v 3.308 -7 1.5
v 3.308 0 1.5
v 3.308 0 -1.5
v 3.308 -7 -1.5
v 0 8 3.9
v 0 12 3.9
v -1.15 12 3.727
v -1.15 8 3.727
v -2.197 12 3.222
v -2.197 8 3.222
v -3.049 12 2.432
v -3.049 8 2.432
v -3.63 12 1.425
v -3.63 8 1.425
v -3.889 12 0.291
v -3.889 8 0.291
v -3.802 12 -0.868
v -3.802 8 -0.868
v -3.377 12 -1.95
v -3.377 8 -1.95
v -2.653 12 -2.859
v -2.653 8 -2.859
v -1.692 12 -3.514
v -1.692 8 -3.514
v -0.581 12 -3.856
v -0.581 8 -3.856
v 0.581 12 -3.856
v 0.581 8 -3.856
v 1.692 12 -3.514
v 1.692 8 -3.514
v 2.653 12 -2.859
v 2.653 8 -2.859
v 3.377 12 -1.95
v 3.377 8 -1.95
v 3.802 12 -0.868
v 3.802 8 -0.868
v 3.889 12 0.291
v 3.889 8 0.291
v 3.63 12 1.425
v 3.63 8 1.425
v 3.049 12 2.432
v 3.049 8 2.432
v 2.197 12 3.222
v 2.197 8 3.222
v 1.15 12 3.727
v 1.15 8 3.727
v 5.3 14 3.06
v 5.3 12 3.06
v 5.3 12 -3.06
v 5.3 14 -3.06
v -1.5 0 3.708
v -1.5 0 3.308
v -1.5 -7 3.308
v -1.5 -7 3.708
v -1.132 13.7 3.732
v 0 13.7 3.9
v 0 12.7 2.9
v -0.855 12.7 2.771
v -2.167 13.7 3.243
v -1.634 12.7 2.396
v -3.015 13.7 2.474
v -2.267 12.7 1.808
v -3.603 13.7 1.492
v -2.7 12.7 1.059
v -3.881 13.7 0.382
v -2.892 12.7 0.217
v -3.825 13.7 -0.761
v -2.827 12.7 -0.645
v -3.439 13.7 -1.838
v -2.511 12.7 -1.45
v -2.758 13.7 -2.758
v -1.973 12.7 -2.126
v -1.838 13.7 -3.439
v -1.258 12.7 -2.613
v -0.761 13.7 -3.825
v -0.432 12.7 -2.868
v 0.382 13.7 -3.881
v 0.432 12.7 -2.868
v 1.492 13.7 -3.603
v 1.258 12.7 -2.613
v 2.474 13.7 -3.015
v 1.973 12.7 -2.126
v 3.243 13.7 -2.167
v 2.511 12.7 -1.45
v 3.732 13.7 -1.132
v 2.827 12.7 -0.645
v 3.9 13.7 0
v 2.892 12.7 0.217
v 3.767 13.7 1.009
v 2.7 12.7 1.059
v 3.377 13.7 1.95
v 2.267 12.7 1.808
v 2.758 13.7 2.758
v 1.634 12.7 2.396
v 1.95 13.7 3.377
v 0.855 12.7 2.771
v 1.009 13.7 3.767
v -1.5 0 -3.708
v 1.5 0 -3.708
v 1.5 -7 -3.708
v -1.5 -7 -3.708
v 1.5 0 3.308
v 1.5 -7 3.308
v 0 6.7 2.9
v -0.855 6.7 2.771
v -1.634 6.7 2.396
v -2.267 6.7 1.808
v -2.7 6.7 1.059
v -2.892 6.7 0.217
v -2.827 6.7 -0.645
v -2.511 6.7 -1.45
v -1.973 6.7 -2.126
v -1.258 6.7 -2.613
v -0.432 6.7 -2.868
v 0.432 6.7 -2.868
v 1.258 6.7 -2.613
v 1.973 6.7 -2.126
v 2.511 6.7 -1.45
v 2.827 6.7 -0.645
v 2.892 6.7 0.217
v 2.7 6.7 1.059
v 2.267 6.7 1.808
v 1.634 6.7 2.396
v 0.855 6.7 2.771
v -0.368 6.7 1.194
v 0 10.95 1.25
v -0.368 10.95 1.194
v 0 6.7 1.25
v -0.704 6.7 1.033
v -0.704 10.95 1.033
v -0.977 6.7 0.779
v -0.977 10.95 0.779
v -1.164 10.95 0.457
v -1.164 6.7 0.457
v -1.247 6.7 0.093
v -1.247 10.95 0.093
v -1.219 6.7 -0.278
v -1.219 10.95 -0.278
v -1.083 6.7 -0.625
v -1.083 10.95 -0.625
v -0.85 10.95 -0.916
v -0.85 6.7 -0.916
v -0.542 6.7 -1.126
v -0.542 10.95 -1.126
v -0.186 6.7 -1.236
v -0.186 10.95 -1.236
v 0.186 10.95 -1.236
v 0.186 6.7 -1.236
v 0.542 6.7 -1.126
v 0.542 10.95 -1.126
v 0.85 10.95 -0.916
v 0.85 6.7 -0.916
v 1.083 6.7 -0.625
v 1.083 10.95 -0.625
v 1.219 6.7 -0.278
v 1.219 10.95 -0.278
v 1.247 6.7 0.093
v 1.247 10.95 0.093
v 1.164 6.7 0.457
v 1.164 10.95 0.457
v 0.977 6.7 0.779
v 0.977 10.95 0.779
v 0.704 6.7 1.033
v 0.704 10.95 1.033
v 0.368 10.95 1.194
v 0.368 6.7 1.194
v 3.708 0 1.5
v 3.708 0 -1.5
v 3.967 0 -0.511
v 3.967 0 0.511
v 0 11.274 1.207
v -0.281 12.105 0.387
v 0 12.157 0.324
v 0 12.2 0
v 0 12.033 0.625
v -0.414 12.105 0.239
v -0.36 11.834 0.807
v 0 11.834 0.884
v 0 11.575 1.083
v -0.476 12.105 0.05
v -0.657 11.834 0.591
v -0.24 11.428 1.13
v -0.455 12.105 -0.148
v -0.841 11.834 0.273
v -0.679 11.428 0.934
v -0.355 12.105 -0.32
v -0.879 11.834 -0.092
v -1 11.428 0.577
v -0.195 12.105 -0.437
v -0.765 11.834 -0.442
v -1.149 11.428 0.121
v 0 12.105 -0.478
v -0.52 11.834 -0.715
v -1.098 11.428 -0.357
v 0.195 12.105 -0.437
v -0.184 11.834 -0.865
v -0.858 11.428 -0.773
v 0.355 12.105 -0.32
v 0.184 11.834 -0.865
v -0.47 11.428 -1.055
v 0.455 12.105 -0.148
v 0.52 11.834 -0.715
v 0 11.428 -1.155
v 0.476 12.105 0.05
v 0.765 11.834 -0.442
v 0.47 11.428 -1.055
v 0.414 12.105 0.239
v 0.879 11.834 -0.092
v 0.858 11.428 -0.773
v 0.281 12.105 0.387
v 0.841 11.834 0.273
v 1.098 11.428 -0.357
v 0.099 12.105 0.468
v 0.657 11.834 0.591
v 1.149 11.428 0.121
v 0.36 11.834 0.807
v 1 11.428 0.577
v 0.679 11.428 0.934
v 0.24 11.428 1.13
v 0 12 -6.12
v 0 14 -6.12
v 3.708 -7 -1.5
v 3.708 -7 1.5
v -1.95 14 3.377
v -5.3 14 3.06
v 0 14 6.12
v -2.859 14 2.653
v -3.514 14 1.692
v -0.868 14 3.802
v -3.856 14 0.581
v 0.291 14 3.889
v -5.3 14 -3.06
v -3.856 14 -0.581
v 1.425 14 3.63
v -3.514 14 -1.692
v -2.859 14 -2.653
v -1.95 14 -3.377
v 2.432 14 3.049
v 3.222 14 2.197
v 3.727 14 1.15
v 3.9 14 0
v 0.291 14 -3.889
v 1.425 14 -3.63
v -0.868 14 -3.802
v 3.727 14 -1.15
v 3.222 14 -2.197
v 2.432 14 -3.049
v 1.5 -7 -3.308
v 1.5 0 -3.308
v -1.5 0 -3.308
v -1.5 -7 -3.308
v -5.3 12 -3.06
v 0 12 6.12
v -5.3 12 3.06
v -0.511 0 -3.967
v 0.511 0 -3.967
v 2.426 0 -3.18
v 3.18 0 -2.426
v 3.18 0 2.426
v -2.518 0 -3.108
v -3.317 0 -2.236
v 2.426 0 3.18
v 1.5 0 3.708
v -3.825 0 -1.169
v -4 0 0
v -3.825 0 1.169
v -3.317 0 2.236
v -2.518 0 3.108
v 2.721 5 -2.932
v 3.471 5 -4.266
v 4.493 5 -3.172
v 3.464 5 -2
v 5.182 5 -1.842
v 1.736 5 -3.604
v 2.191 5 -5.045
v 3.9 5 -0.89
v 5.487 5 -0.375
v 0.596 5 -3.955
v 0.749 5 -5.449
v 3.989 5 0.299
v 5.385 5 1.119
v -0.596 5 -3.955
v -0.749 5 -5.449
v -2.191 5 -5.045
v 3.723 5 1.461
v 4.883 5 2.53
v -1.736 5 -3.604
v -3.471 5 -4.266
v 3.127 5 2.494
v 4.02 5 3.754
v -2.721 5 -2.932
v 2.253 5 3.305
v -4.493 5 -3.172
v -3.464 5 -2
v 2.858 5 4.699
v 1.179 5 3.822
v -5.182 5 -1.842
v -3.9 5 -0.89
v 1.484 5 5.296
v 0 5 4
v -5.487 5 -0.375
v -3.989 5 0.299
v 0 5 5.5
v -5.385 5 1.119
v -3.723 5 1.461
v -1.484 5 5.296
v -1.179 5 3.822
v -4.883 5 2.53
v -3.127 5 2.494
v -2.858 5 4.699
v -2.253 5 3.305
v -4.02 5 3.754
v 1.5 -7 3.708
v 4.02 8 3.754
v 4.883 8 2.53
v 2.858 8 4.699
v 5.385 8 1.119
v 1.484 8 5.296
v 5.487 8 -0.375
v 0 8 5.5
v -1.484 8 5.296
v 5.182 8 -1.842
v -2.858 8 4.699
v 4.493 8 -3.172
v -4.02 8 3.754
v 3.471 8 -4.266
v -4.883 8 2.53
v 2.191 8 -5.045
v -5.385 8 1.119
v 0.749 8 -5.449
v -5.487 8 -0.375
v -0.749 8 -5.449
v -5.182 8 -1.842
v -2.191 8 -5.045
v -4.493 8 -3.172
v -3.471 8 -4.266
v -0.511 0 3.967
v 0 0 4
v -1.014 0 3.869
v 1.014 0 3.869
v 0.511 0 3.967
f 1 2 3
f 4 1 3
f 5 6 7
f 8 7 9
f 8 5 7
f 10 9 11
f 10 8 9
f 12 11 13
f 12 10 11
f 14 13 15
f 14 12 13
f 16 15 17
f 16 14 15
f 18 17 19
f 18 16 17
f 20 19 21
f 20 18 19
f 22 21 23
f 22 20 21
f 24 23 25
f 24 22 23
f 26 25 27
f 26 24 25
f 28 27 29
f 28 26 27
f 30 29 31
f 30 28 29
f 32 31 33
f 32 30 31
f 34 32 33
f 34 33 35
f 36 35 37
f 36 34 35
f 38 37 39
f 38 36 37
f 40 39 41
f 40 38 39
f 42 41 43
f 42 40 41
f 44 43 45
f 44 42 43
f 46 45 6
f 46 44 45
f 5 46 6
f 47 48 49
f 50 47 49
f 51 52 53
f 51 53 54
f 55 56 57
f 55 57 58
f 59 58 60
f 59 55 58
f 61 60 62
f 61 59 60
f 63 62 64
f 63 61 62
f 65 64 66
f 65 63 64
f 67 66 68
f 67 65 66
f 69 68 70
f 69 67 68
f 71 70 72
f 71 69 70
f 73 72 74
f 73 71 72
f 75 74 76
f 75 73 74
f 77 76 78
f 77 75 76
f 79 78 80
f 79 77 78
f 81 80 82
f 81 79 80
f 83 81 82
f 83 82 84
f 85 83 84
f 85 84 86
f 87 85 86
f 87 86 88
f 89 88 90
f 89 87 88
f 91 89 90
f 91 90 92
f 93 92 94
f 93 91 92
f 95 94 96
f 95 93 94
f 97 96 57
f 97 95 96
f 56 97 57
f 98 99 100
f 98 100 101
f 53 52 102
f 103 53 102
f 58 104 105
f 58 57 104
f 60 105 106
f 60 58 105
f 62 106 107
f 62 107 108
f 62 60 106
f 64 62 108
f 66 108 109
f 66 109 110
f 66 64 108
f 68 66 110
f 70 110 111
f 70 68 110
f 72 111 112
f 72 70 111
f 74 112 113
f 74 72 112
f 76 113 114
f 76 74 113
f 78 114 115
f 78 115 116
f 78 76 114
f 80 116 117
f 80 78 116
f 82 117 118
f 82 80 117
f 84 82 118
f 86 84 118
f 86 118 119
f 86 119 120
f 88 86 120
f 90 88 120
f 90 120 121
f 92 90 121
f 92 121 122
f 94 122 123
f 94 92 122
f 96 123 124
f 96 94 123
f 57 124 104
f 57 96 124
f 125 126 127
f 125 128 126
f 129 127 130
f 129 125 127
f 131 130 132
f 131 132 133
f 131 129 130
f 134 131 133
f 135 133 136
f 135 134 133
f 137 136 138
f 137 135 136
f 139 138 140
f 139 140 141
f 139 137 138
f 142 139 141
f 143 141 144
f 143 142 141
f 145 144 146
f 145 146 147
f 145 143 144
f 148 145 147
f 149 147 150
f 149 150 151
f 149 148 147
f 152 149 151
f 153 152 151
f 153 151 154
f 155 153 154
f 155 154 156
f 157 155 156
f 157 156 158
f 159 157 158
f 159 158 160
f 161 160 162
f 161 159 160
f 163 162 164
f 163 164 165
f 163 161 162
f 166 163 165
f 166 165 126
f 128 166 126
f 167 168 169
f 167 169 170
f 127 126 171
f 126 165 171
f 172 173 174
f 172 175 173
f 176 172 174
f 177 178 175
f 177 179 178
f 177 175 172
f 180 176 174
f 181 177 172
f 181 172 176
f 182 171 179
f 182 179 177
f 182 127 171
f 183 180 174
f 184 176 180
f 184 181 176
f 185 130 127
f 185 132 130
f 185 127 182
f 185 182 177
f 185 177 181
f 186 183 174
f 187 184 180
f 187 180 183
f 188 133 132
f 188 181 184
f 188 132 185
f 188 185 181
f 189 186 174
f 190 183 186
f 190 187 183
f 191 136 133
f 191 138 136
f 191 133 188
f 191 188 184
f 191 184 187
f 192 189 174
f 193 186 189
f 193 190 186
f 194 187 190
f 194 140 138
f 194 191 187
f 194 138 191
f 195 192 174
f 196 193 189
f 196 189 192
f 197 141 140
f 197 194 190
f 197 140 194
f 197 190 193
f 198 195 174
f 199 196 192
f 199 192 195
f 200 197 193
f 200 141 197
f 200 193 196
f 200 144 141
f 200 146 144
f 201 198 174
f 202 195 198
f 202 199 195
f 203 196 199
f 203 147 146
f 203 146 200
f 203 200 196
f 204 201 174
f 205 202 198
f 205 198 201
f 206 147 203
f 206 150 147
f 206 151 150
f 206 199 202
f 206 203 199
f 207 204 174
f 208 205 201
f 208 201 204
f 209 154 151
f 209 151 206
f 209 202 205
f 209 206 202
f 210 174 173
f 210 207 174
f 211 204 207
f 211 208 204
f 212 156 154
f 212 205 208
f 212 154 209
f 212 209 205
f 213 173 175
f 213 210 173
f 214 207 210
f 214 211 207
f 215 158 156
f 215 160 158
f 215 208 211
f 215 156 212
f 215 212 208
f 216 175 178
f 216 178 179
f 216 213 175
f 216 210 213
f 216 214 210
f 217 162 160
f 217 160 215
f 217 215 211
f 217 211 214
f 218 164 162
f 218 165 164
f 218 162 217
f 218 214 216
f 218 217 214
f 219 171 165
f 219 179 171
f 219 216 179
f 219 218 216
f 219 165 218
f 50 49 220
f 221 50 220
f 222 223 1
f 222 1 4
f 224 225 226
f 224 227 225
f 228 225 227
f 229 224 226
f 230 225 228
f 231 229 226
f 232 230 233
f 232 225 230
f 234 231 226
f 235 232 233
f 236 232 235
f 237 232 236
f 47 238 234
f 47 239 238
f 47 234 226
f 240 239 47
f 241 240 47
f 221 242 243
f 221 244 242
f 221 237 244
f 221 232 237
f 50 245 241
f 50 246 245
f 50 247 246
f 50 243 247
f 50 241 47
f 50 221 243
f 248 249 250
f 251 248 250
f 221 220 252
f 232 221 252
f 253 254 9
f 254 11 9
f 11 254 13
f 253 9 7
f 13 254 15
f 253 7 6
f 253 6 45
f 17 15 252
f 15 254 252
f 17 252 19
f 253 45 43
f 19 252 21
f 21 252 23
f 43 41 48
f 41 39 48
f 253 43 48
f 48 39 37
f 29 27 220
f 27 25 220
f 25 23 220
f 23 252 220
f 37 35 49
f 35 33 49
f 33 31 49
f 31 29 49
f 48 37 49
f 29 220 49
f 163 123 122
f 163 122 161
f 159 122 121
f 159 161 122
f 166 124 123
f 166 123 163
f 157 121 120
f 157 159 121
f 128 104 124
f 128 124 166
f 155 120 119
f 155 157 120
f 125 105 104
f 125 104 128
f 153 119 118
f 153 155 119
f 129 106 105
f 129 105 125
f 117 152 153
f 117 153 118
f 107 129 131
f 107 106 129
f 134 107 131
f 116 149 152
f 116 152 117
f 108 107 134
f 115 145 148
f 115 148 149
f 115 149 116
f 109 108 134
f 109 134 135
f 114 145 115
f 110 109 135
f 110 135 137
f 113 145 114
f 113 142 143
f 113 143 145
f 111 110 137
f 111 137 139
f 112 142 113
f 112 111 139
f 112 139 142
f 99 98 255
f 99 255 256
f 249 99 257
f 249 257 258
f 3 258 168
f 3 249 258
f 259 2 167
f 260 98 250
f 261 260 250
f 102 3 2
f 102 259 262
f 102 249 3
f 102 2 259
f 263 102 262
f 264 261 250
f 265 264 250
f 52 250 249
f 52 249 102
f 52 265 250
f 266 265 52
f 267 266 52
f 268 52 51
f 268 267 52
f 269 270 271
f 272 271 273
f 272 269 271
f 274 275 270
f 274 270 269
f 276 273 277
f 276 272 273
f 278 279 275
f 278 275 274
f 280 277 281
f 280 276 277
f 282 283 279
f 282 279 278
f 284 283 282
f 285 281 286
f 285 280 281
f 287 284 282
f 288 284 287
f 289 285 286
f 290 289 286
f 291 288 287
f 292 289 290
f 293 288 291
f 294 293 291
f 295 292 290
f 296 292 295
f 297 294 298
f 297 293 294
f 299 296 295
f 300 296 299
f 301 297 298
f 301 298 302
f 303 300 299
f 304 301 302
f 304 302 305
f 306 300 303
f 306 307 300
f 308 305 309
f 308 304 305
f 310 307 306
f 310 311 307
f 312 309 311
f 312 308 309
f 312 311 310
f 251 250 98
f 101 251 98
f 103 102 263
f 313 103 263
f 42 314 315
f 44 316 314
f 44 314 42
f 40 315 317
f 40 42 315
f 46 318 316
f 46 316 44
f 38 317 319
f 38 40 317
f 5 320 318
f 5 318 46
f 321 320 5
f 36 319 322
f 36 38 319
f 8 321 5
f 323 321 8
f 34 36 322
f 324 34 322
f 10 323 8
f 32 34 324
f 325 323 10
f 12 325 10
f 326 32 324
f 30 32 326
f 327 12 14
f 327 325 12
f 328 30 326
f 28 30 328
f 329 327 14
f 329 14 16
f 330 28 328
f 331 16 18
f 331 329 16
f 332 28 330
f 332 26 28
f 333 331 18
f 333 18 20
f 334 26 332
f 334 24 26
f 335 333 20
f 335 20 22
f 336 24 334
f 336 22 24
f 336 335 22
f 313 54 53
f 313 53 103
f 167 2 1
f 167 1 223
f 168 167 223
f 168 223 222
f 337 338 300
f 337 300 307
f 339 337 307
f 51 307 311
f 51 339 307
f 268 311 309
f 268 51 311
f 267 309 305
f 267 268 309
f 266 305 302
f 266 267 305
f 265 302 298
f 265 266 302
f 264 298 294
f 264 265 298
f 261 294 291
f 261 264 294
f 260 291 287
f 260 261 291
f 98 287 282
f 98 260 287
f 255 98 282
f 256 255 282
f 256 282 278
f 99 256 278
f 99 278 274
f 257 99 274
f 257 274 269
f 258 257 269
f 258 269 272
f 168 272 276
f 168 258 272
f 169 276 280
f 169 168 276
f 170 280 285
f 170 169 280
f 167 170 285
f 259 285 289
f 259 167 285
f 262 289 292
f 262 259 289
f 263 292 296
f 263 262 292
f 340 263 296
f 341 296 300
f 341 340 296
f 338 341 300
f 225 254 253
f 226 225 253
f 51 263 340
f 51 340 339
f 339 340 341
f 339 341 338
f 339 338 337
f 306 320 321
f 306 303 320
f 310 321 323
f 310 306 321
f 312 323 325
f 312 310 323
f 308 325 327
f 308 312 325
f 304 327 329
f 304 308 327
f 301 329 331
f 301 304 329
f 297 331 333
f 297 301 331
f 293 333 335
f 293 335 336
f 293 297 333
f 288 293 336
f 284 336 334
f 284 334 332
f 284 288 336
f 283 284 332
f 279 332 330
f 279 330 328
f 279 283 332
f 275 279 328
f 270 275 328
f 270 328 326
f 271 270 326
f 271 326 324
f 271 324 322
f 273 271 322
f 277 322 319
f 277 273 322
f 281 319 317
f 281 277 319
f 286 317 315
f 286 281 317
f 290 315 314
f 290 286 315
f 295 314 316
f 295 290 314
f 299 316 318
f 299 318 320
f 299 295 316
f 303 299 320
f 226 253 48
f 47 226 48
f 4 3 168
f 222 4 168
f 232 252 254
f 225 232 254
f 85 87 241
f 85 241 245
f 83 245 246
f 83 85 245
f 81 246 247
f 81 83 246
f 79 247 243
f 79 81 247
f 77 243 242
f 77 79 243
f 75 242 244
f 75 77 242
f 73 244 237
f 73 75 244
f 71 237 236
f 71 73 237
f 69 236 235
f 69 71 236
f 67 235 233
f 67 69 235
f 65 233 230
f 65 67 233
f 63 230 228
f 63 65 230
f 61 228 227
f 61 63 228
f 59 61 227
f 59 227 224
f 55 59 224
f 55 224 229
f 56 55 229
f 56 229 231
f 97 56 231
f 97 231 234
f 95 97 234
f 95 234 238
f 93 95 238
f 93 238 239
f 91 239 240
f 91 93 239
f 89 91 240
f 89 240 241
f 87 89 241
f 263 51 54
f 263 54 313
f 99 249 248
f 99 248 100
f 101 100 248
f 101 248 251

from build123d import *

# Parameters (mm, degrees)
BOSS_EXTRUDE1_START = 4
SKETCH2_R           = 3.9
BOSS_EXTRUDE1_DEPTH = 2
SKETCH3_W           = 3
SKETCH3_H           = 0.4
BOSS_EXTRUDE2_DEPTH = 7
CIRPATTERN1_COUNT   = 3
CIRPATTERN1_ANGLE   = 180


with BuildPart() as part:
    # Sketch1 → Revolve1 (revolve)
    with BuildSketch(Plane(origin=(0, 0, 0), x_dir=(0, 0, -1), z_dir=(1, 0, 0))):
        with BuildLine():
            Line((-3.9, 13.7), (-3.9, 8))
            Line((-3.9, 8), (-5.5, 8))
            Line((-5.5, 8), (-5.5, 5))
            Line((-5.5, 5), (-4, 5))
            Line((-4, 5), (-4, 0))
            Line((-4, 0), (0, 0))
            Line((0, 0), (0, 12.2))
            ThreePointArc((0, 12.2), (-0.883883476, 11.833883476), (-1.25, 10.95))
            Line((-1.25, 10.95), (-1.25, 6.7))
            Line((-1.25, 6.7), (-2.9, 6.7))
            Line((-2.9, 6.7), (-2.9, 12.7))
            Line((-2.9, 12.7), (-3.9, 13.7))
        make_face()
    revolve(axis=Axis((0, 12.2, 0), (0, -1, 0)))

    # Sketch2 → Boss-Extrude1 (add)
    with BuildSketch(Plane(origin=(0, 8, 0), x_dir=(1, 0, 0), z_dir=(0, 1, 0)).offset(BOSS_EXTRUDE1_START)):
        Polygon((5.3, 3.059956427), (0, 6.119912853), (-5.3, 3.059956427), (-5.3, -3.059956427), (0, -6.119912853), (5.3, -3.059956427), align=None)
        Circle(SKETCH2_R, mode=Mode.SUBTRACT)
    extrude(amount=BOSS_EXTRUDE1_DEPTH)

    # Sketch3 → Boss-Extrude2 (add)
    with BuildSketch(Plane.XZ):
        with Locations((0, 3.508099244)):
            Rectangle(SKETCH3_W, SKETCH3_H)
    boss_extrude2 = extrude(amount=BOSS_EXTRUDE2_DEPTH)

    # CirPattern1: Boss-Extrude2 ×3 about axis
    cirpattern1_axis = Axis((0, 0, 0), (0, 1, 0))
    for i in range(1, CIRPATTERN1_COUNT):
        add(boss_extrude2.rotate(cirpattern1_axis, i * CIRPATTERN1_ANGLE / (CIRPATTERN1_COUNT - 1)))


solid = part.part
